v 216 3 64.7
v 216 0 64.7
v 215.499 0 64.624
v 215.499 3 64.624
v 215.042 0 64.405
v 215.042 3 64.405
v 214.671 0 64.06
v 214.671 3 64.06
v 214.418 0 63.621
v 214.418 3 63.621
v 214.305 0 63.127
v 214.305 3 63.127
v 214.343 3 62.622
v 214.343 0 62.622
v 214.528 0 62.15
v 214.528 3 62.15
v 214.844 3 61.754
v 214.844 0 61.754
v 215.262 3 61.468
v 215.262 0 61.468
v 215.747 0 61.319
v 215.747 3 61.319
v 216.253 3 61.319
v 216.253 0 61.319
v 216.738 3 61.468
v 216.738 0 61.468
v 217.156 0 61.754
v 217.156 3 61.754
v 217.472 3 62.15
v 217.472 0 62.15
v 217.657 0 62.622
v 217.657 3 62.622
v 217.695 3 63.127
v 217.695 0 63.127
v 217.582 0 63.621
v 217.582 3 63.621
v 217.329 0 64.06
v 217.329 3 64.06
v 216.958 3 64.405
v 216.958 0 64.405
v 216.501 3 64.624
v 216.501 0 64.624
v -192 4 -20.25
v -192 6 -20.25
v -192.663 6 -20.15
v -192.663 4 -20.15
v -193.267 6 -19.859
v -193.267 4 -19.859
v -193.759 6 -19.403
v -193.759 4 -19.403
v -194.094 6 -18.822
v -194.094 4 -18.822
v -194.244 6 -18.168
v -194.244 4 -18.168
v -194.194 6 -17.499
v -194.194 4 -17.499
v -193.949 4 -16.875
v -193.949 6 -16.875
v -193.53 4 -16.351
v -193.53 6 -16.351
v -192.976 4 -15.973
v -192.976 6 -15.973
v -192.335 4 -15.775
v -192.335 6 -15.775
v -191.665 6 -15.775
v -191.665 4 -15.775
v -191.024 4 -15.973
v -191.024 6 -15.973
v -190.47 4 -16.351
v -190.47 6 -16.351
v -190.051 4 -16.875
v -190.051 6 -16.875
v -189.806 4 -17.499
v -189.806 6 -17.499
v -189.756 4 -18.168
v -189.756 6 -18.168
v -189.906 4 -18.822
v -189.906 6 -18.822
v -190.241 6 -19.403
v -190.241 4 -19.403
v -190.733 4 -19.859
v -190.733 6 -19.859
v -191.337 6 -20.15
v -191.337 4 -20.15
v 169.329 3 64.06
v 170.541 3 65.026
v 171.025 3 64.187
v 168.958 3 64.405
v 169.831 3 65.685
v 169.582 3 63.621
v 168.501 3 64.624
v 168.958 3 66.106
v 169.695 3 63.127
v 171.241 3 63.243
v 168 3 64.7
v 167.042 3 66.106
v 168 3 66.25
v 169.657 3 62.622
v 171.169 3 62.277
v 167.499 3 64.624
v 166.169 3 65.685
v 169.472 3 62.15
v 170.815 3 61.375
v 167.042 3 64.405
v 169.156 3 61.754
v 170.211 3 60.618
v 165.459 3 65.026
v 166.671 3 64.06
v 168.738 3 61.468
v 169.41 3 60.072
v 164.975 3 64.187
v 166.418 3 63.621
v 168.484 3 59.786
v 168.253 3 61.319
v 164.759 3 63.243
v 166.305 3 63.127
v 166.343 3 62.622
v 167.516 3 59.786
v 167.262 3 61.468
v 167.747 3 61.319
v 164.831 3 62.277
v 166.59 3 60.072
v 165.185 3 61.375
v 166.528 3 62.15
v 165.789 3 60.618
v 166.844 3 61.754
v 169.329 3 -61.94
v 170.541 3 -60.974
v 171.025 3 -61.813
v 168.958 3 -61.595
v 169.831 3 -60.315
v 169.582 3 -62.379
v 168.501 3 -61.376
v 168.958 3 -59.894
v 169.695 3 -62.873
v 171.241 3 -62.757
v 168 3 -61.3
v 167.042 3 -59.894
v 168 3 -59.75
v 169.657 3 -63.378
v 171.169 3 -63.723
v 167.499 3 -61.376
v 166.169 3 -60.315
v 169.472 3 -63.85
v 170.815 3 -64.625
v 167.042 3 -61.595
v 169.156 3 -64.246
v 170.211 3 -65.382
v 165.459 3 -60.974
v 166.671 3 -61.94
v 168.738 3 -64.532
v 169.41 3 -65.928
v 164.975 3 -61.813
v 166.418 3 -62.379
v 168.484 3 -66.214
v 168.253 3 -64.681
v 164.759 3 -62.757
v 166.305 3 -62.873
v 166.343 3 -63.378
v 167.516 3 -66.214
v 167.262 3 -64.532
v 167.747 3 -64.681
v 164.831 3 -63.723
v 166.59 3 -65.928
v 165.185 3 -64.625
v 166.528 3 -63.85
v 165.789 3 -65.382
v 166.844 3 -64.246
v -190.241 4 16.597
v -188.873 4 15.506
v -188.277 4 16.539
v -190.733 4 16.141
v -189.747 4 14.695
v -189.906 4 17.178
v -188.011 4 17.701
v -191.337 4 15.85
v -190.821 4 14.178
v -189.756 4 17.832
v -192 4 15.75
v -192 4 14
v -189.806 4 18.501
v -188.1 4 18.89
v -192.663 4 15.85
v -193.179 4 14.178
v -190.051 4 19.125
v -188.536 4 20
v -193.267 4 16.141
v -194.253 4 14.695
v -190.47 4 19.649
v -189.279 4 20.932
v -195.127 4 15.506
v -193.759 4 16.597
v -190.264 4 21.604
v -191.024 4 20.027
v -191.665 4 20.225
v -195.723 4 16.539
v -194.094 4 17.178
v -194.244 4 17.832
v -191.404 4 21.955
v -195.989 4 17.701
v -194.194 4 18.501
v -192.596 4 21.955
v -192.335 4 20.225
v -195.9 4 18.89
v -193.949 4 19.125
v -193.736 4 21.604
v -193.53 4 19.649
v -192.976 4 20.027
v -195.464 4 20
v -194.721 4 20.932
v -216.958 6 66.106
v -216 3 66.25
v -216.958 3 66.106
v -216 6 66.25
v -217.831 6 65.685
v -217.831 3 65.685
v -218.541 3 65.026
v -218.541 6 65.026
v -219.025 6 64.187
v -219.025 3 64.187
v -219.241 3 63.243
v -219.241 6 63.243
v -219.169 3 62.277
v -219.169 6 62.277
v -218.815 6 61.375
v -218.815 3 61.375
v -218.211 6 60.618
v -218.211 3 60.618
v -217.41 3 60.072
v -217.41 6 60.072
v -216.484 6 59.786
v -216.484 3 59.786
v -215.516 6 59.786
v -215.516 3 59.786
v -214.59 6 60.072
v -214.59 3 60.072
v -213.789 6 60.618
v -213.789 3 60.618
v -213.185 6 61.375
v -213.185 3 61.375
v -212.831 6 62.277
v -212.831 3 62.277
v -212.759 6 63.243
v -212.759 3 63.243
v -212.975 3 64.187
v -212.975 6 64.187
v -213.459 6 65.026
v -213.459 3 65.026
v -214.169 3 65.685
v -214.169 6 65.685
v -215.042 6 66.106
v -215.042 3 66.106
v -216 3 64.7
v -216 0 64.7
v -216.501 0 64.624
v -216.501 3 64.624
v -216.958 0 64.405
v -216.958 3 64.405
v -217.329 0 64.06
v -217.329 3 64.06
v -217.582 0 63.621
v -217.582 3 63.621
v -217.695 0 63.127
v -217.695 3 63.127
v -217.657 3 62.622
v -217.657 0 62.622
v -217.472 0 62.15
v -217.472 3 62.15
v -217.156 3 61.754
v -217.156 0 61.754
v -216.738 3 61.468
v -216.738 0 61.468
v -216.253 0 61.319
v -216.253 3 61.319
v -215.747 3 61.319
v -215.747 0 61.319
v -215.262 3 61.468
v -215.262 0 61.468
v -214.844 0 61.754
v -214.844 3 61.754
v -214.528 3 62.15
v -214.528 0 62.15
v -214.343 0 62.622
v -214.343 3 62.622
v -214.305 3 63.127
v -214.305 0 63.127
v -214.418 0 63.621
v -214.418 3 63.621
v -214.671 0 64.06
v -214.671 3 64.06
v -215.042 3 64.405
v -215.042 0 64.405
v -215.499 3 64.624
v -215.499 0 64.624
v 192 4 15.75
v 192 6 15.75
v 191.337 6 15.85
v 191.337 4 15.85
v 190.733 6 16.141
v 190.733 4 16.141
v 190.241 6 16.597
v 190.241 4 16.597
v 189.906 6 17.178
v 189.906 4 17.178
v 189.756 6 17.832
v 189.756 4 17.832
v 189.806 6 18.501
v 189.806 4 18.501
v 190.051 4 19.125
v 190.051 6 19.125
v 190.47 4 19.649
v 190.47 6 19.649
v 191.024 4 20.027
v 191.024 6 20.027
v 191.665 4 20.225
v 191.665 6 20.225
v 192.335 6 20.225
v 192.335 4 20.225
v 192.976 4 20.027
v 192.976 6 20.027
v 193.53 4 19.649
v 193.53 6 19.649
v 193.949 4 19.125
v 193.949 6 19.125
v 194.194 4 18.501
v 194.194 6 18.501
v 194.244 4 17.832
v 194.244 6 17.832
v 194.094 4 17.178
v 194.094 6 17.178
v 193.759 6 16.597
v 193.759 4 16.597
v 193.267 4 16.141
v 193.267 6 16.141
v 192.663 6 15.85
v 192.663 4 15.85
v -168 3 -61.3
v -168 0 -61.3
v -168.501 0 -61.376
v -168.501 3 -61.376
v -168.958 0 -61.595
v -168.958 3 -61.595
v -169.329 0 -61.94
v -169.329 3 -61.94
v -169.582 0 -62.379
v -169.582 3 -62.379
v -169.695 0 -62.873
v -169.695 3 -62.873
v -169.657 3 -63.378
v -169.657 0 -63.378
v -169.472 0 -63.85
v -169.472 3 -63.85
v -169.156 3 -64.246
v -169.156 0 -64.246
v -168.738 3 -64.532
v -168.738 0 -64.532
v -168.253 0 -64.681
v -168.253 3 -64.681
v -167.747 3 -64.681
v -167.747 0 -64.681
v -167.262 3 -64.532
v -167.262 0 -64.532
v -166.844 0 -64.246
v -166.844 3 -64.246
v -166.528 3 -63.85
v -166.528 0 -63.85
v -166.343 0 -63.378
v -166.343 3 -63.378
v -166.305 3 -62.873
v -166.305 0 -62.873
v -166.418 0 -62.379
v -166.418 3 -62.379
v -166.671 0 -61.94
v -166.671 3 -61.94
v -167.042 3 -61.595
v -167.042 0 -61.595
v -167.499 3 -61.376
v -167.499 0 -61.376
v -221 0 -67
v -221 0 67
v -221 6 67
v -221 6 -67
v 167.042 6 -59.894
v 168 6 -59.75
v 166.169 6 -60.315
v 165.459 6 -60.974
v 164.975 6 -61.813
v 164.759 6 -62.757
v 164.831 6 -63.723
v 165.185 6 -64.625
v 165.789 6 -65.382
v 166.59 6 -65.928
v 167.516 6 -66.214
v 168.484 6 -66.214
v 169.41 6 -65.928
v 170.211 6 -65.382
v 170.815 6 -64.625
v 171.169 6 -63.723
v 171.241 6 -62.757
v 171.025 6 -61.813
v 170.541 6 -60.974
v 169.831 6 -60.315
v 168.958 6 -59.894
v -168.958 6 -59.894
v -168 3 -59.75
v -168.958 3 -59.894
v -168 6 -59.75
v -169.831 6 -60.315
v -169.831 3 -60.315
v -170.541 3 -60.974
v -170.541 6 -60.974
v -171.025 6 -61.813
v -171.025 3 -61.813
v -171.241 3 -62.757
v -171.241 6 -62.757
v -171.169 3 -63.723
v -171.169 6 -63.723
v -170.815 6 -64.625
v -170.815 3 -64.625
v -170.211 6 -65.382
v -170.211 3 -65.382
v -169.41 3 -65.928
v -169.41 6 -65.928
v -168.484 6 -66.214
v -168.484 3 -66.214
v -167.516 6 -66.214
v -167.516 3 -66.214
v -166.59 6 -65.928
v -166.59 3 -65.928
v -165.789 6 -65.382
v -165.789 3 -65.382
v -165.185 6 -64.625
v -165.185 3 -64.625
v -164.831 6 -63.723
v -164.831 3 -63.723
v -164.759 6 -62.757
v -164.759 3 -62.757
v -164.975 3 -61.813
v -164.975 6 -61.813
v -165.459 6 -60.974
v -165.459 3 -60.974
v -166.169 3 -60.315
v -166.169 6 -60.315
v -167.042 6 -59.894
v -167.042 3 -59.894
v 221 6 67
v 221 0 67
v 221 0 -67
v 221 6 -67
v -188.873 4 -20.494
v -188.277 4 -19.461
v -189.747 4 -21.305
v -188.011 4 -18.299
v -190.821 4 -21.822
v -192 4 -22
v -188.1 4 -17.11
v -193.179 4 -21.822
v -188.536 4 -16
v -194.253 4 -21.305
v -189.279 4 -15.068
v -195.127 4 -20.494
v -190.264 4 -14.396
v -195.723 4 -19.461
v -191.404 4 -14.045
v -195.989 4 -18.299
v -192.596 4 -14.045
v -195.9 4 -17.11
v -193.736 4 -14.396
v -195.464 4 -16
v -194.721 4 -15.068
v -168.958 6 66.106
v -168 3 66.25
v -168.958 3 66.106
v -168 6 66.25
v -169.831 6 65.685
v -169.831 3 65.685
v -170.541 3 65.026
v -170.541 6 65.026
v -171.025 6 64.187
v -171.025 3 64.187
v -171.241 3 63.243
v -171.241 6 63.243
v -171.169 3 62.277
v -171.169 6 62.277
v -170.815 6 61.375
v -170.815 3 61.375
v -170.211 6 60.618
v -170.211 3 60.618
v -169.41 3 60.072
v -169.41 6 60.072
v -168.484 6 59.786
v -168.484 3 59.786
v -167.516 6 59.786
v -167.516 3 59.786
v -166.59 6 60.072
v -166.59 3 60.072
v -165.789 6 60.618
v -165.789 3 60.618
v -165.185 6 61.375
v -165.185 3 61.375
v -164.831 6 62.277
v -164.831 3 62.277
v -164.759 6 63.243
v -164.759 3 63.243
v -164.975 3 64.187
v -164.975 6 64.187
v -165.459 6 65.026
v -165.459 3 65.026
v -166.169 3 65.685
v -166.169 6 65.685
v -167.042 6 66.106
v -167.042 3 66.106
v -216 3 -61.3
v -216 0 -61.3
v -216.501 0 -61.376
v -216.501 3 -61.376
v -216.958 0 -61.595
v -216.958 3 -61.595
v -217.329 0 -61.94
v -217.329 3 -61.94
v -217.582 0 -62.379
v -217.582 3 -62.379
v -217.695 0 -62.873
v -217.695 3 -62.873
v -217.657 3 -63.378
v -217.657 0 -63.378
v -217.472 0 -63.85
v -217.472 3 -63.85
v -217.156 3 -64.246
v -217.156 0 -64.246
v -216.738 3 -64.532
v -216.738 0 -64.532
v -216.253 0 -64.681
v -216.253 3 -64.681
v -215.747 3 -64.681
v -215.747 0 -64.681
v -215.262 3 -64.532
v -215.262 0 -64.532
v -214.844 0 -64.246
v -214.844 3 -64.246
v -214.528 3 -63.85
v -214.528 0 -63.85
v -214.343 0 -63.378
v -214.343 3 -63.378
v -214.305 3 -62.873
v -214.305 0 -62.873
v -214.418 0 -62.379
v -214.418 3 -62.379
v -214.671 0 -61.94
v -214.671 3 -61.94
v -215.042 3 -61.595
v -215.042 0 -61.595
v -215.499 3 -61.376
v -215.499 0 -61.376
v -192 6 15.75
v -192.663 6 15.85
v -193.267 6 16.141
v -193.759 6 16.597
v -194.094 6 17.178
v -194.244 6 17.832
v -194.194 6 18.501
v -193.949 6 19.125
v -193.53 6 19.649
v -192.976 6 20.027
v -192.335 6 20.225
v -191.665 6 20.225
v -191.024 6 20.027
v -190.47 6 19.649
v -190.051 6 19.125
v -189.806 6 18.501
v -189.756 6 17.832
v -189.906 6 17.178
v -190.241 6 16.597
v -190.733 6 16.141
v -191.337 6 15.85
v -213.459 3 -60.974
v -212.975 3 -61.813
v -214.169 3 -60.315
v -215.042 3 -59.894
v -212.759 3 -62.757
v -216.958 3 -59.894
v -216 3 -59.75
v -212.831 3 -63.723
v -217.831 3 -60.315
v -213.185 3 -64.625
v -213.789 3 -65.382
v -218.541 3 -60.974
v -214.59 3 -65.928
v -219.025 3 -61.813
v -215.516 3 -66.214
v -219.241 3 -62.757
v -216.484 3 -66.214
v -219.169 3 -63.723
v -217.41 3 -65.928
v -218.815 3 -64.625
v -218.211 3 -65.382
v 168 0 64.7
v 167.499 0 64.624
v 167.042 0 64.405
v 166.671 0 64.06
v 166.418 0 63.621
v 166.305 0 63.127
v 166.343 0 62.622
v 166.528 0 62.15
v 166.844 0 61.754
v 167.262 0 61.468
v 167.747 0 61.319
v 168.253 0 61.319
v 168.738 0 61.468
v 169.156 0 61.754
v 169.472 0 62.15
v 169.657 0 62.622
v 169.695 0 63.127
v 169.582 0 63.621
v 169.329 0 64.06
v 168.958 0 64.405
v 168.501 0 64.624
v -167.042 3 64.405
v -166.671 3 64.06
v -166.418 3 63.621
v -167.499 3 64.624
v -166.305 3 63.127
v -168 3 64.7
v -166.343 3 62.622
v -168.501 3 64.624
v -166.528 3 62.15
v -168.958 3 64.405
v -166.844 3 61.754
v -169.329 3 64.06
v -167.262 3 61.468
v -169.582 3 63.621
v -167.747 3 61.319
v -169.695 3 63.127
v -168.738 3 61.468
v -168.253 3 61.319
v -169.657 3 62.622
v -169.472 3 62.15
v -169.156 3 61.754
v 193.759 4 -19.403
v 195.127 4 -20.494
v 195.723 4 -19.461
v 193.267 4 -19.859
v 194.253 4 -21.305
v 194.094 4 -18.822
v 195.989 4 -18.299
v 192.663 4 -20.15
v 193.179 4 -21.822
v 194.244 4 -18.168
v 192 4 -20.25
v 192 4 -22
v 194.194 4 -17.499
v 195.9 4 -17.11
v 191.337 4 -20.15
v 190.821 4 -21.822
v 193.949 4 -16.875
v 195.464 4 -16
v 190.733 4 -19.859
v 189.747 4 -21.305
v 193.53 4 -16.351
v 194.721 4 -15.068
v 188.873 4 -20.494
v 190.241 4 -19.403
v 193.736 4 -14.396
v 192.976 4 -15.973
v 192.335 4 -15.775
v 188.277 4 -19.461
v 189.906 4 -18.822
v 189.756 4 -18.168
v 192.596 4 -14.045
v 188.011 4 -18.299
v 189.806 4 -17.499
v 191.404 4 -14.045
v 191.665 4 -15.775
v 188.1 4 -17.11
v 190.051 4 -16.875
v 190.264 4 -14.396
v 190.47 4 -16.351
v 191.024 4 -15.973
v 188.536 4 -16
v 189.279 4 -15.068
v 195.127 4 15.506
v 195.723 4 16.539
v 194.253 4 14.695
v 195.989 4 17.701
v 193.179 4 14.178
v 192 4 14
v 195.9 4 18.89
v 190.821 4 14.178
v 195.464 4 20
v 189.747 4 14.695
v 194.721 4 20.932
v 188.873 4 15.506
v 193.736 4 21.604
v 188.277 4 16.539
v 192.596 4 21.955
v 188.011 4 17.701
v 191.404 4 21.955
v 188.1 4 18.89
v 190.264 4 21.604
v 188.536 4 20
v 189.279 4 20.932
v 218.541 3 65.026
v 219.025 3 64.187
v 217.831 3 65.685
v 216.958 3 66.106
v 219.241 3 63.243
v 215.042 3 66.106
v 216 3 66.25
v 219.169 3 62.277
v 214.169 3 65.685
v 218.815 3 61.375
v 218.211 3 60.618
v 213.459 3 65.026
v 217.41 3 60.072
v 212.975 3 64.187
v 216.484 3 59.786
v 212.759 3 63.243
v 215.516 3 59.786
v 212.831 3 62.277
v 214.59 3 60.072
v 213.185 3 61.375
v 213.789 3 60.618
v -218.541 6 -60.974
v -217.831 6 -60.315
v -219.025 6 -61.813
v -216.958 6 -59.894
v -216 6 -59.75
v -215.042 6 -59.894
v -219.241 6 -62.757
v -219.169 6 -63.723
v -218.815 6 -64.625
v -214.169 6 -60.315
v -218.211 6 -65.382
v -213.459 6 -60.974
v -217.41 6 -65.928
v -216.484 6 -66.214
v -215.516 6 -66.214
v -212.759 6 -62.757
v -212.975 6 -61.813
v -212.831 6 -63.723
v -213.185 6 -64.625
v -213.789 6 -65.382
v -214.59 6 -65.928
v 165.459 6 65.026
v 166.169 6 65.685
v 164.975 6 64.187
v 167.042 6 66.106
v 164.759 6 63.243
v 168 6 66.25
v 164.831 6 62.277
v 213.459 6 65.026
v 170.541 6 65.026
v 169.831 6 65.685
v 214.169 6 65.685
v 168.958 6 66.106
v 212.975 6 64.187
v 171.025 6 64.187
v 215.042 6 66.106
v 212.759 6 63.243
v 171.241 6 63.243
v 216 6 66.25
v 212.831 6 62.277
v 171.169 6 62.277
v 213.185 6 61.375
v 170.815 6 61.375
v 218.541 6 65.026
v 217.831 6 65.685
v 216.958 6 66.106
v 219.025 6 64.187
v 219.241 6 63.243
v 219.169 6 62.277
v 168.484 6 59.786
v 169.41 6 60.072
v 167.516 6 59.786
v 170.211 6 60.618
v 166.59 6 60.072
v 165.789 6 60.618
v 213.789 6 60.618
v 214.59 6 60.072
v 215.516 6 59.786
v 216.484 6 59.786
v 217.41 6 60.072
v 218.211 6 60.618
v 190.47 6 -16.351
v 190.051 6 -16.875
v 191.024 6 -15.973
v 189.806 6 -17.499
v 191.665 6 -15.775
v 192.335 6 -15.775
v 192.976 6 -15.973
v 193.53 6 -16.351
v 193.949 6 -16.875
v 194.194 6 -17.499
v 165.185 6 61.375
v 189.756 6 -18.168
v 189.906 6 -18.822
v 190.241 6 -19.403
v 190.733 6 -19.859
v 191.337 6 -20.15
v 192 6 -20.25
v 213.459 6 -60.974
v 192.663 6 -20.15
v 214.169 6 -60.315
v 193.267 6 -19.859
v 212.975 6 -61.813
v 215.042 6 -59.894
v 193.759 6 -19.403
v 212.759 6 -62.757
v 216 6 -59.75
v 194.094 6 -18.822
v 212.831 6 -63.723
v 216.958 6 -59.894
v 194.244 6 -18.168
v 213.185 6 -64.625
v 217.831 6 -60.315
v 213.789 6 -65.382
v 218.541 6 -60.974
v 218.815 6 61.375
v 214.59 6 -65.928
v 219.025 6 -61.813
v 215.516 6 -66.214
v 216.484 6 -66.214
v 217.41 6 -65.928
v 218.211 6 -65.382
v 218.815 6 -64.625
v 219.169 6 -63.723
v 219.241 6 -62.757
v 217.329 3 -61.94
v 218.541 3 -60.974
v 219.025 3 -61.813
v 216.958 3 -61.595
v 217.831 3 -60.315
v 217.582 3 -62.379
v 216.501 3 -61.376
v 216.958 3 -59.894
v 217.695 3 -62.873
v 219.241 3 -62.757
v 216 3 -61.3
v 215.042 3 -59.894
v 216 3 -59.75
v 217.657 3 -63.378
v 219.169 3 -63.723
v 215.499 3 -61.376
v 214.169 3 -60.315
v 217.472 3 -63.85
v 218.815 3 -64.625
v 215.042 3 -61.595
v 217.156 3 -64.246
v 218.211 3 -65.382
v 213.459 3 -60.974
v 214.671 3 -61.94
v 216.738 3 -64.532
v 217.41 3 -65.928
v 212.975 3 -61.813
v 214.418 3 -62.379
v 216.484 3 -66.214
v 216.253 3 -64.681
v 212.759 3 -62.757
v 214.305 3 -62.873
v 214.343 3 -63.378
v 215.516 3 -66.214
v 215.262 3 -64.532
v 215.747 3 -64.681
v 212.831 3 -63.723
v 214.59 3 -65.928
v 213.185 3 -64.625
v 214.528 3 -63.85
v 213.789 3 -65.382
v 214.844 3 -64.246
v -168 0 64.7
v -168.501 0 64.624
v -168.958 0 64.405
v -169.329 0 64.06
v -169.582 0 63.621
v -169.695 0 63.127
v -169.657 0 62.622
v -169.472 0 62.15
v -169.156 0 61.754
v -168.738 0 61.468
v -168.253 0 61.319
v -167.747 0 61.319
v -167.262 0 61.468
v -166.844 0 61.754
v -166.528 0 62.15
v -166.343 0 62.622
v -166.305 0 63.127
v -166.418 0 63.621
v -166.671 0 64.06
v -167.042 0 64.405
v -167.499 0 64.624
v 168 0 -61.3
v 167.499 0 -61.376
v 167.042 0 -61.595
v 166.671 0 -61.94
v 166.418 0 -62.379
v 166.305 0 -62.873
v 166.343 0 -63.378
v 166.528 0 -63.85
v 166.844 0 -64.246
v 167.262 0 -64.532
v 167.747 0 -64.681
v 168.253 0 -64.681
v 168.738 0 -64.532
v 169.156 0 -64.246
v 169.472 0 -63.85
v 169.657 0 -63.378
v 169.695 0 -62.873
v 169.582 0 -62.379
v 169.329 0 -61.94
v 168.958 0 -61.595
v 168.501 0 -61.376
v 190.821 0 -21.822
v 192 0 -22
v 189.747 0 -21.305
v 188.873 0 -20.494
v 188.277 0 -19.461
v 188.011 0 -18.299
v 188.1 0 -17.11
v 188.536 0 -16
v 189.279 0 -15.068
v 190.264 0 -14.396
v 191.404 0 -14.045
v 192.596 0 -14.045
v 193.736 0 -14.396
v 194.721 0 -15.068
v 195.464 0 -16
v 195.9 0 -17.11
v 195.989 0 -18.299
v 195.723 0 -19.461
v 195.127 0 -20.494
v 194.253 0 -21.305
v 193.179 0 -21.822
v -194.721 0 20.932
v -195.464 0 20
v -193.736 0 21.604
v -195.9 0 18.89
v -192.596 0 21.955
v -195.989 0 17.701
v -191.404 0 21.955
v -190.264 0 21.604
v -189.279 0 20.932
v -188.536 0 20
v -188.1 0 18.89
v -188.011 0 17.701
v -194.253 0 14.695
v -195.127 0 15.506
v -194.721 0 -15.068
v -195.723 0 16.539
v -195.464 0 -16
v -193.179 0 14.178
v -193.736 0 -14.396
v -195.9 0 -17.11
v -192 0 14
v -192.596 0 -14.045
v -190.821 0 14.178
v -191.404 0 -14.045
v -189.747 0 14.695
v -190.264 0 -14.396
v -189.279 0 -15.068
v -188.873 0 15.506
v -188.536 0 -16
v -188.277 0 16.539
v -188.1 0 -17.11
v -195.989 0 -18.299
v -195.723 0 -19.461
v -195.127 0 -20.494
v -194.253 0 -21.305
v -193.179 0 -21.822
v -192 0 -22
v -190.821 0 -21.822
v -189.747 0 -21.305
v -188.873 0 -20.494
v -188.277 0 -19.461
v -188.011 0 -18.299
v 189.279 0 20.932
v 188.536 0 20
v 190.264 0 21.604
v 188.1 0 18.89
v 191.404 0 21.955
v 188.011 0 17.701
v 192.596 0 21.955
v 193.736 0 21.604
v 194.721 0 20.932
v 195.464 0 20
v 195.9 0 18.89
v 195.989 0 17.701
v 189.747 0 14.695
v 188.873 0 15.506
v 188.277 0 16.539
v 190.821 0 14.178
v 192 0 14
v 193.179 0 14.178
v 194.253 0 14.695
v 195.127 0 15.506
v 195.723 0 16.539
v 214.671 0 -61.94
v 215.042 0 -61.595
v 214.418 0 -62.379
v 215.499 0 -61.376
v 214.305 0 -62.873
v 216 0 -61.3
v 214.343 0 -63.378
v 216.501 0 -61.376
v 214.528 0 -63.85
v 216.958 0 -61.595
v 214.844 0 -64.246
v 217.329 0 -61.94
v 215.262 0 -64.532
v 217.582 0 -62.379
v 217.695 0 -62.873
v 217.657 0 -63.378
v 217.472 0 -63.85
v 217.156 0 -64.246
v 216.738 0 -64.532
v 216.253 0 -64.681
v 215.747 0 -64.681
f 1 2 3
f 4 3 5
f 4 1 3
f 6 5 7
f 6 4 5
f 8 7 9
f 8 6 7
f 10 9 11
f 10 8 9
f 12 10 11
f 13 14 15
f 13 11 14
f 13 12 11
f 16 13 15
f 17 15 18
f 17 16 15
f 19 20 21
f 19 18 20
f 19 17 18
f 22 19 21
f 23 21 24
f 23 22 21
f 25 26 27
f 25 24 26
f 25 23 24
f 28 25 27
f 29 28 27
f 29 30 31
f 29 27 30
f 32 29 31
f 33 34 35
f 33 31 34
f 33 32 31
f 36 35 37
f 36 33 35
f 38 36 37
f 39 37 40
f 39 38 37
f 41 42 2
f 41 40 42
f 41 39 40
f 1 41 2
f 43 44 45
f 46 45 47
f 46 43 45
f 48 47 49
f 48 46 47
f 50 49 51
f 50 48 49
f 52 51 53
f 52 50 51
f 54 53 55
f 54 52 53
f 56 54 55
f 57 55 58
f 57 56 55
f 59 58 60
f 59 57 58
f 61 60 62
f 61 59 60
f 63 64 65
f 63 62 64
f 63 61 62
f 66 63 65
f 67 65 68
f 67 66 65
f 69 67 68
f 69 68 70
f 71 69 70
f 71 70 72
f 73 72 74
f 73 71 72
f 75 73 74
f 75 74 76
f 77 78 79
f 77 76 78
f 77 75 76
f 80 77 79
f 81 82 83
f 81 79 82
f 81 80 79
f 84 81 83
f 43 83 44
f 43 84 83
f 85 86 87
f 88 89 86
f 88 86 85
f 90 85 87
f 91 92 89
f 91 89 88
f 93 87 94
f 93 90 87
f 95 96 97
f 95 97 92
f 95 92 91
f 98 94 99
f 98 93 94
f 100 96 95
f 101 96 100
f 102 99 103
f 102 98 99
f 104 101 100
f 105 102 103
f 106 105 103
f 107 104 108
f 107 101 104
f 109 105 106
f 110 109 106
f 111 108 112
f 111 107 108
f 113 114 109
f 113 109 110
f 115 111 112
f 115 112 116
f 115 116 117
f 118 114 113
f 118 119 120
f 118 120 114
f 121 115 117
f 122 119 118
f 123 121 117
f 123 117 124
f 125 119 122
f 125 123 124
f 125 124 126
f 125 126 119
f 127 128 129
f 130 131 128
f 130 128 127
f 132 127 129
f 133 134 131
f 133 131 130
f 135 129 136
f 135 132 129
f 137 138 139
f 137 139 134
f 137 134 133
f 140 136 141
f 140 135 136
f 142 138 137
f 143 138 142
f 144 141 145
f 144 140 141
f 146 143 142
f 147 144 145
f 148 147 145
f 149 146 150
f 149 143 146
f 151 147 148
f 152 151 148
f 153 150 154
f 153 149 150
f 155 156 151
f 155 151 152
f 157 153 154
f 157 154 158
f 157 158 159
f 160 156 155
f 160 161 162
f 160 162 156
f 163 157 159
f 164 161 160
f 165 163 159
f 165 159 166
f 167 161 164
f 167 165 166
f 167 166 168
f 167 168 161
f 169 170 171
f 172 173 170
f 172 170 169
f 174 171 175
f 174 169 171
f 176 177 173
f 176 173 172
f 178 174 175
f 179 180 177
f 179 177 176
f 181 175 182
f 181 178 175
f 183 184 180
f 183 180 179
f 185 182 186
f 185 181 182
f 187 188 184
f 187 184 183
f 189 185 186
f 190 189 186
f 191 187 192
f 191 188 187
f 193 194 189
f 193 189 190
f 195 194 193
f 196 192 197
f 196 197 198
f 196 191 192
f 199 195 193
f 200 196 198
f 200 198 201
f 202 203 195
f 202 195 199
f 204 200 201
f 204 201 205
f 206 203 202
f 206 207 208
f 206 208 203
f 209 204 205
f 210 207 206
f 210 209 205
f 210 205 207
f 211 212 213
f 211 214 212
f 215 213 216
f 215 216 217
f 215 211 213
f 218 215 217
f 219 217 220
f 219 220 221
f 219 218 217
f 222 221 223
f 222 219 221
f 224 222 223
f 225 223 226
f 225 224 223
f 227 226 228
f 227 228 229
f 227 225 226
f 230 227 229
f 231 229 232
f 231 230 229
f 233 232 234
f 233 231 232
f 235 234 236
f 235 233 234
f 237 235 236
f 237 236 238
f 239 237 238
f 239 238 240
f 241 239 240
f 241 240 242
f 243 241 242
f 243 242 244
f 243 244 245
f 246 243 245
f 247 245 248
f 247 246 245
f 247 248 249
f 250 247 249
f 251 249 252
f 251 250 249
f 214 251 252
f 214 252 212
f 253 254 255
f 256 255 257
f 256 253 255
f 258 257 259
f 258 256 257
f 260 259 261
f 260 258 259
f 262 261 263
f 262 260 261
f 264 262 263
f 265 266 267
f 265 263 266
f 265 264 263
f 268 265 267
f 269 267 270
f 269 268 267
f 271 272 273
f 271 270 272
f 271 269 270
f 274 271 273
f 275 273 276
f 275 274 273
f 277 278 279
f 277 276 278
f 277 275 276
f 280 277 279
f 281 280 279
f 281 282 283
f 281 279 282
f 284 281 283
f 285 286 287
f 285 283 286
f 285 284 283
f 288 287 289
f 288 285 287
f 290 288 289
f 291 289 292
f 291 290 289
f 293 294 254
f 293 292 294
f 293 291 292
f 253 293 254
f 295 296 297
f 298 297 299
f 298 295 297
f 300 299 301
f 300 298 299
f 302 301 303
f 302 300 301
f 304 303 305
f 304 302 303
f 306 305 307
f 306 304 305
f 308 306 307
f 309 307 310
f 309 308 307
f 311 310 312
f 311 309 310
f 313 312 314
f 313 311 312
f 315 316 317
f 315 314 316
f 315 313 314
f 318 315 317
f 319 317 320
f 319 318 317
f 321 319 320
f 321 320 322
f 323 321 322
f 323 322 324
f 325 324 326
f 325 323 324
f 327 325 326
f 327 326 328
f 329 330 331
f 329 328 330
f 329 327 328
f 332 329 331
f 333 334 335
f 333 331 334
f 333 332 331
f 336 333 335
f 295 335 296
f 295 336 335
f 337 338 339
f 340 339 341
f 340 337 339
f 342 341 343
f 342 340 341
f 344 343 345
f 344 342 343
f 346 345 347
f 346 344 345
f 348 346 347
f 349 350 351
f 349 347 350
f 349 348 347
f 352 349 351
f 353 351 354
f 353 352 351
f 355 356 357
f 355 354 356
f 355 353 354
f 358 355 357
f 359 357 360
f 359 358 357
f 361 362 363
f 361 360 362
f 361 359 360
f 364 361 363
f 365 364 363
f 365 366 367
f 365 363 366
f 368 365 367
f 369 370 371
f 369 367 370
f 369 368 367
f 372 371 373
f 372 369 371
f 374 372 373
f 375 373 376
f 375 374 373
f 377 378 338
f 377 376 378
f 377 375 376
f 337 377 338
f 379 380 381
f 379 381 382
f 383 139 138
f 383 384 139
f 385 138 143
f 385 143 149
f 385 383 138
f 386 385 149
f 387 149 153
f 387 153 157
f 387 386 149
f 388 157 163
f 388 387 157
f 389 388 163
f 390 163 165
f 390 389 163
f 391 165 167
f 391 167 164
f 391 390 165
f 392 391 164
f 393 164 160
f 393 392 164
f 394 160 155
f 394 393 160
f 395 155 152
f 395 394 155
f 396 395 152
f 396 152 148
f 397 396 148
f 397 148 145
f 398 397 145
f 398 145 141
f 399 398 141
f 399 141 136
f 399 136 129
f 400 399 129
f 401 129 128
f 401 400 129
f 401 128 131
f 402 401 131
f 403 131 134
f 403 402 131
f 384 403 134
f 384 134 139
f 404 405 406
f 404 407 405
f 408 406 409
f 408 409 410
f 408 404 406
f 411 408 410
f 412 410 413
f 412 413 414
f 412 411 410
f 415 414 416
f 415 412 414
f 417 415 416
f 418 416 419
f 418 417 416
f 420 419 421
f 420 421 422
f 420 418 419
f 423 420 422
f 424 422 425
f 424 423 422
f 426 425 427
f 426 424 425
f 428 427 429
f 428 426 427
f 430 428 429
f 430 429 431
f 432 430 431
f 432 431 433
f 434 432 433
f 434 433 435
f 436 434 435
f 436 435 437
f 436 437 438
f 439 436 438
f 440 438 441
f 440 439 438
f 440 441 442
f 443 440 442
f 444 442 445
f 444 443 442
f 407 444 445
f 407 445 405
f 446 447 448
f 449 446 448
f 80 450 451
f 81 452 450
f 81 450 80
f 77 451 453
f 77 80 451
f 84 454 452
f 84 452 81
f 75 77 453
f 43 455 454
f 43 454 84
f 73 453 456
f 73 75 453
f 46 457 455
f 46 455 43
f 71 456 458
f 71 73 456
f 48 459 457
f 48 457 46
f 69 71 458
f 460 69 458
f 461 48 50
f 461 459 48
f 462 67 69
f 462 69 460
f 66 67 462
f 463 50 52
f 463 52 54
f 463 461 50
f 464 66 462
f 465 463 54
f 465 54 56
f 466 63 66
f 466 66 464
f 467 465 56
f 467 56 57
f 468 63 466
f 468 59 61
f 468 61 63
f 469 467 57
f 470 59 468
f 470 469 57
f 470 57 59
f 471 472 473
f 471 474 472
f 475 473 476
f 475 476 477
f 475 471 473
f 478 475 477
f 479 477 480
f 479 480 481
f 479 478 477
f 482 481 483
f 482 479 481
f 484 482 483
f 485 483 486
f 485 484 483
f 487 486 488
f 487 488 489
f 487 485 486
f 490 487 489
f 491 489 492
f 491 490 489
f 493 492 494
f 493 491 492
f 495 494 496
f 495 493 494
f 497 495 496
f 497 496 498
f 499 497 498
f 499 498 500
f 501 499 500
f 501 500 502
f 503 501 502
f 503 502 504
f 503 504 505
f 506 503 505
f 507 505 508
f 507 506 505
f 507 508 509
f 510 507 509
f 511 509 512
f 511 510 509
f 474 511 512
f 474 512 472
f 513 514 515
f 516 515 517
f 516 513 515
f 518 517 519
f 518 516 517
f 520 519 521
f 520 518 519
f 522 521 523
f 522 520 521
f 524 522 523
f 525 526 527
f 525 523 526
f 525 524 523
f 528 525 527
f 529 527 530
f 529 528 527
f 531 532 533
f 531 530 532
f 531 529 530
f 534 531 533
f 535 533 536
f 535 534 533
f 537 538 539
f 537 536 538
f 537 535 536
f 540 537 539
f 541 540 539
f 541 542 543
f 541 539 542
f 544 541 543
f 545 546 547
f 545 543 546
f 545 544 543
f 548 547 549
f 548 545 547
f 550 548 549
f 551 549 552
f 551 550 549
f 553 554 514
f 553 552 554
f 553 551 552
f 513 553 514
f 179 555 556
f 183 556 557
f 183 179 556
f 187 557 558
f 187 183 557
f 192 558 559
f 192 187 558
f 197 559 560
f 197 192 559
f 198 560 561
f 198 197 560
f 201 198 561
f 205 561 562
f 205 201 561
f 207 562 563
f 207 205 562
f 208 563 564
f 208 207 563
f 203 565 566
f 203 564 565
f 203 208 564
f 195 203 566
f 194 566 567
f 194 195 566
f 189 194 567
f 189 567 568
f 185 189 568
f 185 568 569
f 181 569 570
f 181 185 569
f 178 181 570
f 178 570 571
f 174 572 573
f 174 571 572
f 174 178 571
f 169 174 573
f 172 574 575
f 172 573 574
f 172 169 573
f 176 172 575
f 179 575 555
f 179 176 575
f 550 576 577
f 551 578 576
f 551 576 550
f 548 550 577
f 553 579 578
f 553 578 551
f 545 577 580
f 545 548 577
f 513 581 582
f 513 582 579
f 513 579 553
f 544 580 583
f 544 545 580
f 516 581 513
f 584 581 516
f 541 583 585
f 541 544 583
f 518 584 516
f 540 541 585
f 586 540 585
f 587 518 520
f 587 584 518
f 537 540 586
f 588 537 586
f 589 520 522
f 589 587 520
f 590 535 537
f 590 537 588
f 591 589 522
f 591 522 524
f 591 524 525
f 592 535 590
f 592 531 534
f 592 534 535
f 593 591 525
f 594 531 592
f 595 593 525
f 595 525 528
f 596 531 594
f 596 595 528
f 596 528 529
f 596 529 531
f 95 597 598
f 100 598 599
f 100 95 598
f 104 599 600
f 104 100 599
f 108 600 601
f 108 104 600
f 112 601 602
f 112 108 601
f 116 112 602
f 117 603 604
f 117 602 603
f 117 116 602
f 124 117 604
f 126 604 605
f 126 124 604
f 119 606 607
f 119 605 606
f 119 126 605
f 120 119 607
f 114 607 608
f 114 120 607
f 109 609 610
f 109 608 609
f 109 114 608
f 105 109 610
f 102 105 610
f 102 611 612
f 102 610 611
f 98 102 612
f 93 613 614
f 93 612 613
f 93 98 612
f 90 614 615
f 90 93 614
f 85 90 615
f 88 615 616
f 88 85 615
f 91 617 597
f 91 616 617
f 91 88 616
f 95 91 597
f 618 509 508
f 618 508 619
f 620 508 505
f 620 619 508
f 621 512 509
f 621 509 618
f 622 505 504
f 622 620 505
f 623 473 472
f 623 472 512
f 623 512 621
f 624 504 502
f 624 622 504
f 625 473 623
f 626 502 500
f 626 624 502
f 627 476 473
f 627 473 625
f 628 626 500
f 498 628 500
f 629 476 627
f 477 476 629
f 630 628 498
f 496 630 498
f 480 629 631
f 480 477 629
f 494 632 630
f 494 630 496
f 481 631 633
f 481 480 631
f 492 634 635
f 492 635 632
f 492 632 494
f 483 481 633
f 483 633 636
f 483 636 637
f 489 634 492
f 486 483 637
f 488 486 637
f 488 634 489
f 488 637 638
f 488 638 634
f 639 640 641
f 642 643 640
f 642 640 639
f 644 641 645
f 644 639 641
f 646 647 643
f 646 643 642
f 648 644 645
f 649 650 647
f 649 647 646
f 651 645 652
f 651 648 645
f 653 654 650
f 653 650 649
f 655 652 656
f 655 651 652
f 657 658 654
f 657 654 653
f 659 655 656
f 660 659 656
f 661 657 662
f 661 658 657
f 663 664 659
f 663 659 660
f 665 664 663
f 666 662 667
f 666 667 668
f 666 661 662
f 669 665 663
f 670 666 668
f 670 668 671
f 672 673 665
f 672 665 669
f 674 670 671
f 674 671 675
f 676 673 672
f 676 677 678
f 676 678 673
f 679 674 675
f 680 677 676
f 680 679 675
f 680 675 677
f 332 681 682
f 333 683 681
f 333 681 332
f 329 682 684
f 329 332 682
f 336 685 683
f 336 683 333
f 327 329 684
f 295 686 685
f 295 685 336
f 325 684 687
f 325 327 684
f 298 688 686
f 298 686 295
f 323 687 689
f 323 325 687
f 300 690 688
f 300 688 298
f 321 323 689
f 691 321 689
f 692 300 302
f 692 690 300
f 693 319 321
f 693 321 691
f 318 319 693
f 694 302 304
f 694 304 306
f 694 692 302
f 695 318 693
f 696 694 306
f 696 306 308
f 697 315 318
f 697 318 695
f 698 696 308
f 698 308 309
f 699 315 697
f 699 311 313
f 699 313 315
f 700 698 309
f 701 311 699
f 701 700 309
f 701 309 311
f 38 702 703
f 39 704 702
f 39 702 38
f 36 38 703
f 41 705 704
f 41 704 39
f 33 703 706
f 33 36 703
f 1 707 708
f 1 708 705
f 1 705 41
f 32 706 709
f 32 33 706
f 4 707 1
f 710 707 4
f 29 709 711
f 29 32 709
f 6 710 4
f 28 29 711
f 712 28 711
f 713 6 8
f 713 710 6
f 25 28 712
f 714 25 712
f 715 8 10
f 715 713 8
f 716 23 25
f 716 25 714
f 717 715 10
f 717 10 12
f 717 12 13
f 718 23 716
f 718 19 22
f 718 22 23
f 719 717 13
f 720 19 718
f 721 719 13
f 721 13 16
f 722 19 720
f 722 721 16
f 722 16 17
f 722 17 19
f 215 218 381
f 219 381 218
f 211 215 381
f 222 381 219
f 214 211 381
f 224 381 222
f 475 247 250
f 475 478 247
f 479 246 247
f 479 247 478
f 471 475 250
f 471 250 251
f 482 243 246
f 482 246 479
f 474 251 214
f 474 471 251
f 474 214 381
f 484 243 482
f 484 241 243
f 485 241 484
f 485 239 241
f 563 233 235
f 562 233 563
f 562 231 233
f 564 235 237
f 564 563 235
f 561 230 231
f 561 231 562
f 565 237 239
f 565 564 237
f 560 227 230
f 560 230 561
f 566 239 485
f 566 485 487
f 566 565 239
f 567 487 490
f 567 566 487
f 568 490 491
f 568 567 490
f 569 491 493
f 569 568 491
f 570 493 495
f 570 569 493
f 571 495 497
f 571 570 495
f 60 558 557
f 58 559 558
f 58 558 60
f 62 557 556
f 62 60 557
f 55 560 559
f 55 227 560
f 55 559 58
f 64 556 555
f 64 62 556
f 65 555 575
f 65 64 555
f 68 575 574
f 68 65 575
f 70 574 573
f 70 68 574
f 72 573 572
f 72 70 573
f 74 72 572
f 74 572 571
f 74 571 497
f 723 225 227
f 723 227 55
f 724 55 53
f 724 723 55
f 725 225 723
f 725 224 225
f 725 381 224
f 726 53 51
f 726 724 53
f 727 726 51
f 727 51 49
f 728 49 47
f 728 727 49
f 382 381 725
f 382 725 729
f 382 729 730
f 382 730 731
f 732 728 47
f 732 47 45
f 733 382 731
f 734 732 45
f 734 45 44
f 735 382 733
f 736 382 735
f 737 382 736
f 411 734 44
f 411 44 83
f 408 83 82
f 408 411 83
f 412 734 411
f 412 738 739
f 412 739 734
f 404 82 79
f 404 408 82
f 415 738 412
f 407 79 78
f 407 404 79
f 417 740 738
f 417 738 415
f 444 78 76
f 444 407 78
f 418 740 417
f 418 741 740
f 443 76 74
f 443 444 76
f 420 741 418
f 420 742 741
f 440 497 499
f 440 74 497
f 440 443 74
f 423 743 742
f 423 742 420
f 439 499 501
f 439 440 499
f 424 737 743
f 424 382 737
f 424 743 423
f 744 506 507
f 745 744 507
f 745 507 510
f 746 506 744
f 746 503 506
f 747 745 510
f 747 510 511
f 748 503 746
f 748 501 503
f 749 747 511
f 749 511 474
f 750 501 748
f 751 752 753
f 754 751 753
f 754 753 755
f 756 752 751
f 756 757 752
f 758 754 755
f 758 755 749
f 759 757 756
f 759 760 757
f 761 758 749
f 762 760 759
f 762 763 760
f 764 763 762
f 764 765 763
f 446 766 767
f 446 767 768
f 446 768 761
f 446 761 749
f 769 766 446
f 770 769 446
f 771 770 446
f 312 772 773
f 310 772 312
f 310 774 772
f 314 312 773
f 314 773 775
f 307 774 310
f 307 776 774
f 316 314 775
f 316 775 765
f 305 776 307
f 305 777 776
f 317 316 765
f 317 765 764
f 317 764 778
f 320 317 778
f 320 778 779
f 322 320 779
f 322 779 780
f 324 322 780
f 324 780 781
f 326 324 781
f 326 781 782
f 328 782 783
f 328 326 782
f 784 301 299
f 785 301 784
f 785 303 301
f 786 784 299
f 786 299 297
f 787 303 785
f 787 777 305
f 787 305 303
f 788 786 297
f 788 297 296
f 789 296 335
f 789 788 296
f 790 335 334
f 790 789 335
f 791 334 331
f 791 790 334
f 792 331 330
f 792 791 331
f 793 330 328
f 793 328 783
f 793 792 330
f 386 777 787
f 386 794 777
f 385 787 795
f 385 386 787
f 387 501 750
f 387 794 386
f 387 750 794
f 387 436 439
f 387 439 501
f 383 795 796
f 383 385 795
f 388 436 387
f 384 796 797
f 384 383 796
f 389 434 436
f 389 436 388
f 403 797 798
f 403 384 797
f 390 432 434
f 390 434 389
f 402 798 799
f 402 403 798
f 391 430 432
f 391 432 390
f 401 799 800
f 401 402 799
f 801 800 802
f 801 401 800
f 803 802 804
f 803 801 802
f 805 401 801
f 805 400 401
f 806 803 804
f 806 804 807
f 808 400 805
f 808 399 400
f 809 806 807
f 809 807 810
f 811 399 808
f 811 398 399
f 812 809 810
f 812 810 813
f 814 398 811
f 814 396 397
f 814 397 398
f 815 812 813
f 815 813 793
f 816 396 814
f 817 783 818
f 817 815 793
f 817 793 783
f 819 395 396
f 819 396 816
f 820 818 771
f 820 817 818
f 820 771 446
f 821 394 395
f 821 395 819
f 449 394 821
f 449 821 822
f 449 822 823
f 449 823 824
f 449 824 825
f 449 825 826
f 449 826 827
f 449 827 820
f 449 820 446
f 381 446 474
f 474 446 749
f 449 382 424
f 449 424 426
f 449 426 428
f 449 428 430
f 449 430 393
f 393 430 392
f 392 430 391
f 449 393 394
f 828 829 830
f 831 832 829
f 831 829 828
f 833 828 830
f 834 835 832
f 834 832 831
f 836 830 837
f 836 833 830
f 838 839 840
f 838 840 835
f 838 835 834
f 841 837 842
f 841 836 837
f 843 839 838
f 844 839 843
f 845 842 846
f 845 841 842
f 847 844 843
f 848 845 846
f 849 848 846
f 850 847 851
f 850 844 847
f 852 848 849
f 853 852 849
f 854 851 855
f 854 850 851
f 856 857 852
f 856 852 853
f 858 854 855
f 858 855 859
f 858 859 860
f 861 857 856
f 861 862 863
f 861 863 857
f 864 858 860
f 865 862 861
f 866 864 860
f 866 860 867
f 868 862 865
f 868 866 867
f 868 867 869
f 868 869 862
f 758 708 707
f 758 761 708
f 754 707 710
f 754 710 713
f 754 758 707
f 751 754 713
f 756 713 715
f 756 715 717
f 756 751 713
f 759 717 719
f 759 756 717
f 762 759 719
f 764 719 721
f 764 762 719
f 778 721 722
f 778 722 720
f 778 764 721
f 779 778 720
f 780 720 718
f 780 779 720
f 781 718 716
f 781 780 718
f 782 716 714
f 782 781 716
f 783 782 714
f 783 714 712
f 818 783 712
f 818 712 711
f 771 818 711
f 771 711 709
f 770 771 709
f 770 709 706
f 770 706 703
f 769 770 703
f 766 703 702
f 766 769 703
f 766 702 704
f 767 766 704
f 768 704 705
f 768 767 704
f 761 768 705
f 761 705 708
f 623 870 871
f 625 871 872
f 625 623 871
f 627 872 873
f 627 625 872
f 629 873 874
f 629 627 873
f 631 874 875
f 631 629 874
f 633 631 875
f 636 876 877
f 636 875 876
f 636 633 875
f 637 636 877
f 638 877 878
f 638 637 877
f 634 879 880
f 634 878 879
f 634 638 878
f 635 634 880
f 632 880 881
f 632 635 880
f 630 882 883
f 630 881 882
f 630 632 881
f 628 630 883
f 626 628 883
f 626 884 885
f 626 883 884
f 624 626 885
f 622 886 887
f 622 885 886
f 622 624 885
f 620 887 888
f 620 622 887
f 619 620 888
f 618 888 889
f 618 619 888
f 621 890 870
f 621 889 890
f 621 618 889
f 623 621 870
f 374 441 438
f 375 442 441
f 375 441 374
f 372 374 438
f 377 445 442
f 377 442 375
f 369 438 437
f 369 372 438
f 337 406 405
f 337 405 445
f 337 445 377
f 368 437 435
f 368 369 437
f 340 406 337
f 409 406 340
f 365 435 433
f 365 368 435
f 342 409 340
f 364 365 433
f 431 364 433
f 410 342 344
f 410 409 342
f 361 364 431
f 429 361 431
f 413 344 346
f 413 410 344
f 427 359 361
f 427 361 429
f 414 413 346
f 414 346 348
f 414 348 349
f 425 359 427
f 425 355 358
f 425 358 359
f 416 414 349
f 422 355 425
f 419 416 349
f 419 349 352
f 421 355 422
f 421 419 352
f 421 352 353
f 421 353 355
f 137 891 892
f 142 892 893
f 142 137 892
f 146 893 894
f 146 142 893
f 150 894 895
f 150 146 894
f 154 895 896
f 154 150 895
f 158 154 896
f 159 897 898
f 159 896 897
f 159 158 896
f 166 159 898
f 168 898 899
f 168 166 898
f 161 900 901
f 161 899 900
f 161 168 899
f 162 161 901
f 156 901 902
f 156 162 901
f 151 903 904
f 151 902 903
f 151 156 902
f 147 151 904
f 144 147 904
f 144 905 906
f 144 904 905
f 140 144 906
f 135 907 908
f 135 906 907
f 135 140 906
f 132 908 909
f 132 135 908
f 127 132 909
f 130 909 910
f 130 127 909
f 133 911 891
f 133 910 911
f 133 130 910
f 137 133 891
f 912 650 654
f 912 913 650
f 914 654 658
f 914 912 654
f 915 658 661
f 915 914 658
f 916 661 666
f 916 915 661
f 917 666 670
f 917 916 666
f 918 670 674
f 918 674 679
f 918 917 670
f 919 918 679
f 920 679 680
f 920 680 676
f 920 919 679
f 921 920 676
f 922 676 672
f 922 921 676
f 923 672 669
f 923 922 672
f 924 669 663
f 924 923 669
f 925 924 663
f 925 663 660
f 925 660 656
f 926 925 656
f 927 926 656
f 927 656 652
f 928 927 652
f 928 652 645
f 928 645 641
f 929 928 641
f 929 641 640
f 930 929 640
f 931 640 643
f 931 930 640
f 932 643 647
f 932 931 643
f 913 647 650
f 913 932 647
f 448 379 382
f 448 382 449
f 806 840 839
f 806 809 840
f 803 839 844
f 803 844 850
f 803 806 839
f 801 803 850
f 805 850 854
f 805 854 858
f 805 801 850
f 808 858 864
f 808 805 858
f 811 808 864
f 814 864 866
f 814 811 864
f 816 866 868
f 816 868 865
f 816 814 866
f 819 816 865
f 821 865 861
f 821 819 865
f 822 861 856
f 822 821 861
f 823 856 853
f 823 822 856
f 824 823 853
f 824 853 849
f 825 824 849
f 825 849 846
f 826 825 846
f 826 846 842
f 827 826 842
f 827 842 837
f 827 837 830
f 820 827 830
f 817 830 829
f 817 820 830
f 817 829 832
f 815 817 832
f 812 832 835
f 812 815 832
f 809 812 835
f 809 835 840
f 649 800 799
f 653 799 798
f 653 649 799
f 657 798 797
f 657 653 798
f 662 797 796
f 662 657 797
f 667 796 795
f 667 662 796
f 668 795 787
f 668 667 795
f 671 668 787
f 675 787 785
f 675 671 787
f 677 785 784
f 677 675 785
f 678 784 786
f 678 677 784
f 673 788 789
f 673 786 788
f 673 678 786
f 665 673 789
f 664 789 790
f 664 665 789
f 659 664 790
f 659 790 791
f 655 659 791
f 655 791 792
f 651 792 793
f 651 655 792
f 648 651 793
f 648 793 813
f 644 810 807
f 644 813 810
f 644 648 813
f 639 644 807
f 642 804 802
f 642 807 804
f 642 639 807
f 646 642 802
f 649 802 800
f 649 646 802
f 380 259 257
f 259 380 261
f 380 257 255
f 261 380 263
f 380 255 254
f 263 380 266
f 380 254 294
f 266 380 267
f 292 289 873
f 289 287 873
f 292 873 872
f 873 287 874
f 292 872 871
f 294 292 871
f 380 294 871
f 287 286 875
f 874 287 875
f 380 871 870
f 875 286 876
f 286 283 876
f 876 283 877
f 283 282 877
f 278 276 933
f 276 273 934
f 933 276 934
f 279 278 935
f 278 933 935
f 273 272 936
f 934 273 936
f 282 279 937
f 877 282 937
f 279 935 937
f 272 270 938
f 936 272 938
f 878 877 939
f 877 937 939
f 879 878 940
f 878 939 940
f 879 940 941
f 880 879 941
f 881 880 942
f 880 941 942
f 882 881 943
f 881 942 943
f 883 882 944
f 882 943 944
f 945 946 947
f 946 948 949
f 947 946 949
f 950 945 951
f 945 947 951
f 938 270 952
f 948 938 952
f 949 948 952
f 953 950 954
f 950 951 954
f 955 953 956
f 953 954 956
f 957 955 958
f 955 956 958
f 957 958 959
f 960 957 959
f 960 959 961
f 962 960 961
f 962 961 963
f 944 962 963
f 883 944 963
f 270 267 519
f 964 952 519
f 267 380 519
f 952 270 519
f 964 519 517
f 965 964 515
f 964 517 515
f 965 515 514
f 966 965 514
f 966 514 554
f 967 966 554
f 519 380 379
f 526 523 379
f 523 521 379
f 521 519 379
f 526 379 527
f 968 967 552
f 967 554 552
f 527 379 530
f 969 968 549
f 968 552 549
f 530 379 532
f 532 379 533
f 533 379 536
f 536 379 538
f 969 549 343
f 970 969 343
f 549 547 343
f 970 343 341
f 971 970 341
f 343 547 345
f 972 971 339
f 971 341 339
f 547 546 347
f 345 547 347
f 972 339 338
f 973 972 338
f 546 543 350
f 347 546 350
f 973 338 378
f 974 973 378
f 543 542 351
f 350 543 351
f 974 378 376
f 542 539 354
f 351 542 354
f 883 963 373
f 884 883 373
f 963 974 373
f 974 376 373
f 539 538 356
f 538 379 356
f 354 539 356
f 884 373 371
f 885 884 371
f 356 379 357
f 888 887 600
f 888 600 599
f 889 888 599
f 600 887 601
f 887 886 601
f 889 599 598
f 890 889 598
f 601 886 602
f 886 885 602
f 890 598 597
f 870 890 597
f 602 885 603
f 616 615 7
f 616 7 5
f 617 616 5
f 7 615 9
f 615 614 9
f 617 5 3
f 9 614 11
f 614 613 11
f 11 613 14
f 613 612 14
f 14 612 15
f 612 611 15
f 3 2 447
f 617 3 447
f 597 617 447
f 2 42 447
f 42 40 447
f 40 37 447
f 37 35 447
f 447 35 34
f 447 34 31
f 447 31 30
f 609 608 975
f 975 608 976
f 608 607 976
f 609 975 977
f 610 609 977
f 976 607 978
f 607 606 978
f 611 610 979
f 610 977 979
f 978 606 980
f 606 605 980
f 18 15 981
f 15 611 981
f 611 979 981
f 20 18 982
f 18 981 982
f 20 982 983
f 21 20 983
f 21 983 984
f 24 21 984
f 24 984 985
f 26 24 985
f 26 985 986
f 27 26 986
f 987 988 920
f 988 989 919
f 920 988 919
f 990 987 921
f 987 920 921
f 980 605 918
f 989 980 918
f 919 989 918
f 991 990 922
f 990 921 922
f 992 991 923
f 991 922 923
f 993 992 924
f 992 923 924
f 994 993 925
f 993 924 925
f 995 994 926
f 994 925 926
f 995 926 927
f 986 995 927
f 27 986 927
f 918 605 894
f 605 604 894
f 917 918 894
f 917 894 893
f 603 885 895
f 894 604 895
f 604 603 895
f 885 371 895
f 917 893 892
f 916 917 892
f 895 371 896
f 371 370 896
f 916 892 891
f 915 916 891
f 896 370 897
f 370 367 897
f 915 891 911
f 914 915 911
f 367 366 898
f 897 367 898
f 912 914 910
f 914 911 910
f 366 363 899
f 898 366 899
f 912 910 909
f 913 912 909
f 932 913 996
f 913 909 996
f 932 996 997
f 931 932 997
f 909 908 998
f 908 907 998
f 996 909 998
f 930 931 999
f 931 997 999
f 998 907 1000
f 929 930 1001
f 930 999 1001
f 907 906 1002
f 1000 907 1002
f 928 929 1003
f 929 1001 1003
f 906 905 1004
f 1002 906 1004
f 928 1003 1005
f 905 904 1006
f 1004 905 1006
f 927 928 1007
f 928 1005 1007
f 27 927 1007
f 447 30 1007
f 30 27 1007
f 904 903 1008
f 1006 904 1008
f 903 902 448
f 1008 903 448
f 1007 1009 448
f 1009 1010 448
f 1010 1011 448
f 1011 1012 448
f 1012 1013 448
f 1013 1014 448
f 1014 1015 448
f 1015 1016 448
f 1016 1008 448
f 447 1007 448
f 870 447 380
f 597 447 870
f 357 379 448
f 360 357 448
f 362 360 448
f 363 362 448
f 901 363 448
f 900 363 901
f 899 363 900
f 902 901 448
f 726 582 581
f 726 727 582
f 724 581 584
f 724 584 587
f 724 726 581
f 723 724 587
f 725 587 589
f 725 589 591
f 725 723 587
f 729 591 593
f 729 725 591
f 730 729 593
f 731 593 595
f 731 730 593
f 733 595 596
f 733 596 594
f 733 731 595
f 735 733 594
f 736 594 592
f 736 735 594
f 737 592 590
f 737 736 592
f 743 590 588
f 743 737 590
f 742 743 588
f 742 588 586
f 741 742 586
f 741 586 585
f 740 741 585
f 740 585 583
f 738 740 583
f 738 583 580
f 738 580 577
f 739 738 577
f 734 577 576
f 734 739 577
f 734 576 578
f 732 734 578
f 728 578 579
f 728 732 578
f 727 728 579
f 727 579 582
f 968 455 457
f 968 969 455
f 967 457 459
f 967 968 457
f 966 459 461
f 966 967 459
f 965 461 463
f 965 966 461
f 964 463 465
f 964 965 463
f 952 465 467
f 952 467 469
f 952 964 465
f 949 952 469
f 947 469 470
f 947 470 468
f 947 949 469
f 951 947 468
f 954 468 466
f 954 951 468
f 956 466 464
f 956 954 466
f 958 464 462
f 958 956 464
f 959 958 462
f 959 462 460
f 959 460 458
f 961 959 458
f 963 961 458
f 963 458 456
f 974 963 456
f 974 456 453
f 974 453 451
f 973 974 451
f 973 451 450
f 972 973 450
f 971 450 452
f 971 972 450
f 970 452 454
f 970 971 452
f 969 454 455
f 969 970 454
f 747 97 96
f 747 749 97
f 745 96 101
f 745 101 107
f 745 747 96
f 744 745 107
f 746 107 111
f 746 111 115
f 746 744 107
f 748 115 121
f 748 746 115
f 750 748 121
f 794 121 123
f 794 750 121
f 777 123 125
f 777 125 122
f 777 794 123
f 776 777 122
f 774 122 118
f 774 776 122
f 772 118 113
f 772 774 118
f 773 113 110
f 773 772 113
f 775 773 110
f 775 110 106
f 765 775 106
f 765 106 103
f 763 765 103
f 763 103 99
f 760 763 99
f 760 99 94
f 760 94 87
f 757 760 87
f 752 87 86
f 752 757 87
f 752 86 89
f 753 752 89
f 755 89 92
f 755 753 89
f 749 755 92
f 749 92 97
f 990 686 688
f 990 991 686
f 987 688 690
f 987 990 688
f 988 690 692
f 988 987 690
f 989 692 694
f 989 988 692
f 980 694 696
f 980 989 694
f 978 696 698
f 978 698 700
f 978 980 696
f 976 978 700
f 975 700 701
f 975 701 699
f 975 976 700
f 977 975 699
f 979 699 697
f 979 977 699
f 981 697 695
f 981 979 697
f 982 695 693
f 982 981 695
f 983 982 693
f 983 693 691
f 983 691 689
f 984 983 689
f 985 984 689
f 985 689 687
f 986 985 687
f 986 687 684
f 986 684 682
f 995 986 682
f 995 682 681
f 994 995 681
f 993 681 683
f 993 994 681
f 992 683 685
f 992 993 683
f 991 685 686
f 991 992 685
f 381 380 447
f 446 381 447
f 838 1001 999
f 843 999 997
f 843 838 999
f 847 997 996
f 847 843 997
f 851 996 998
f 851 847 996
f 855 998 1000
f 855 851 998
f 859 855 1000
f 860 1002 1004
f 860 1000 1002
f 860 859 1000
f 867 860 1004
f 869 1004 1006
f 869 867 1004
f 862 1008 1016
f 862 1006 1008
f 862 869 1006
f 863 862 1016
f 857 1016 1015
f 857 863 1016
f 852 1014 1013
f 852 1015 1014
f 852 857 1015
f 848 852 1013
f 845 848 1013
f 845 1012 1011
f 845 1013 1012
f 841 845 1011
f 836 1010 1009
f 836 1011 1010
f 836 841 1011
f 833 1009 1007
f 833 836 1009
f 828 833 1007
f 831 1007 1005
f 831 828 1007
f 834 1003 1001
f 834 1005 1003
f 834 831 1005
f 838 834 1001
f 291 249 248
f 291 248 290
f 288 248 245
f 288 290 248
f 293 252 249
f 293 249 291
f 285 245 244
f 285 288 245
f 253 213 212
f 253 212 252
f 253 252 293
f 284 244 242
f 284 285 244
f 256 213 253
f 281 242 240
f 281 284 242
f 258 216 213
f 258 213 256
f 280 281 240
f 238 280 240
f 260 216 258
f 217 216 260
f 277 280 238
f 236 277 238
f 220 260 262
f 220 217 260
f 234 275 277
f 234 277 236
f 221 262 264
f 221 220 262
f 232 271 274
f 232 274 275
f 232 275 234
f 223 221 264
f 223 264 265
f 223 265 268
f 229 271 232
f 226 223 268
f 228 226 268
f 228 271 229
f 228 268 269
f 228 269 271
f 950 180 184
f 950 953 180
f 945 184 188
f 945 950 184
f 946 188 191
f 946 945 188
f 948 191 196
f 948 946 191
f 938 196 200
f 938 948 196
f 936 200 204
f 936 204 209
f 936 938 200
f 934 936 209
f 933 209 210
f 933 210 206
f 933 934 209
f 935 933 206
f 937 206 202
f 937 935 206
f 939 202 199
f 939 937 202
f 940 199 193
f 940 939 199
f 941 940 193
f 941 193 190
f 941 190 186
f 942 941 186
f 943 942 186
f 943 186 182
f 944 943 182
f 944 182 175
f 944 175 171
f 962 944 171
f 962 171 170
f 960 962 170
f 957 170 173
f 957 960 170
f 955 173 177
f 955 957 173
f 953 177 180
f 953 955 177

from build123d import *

# Parameters (mm, degrees)
SKETCH1_W                     = 442
SKETCH1_H                     = 134
BOSS_EXTRUDE1_DEPTH           = 6
CBORE_FOR_M3_SHCS2_AT_2_COUNT = 2
CBORE_FOR_M3_SHCS2_AT_2_PITCH = 48
CBORE_FOR_M3_SHCS2_AT_3_COUNT = 2
CBORE_FOR_M3_SHCS2_AT_3_PITCH = 134.833230325
CBORE_FOR_M3_SHCS2_AT_4_COUNT = 2
CBORE_FOR_M3_SHCS2_AT_4_PITCH = 126
CBORE_FOR_M4_SHCS1_AT_2_COUNT = 2
CBORE_FOR_M4_SHCS1_AT_2_PITCH = 36
LPATTERN1_COUNT               = 2
LPATTERN1_PITCH               = 384


with BuildPart() as part:
    # Sketch1 → Boss-Extrude1 (new body)
    with BuildSketch(Plane(origin=(0, 0, 0), x_dir=(1, 0, 0), z_dir=(0, 1, 0))):
        Rectangle(SKETCH1_W, SKETCH1_H)
    extrude(amount=BOSS_EXTRUDE1_DEPTH)

    # Sketch3 → CBORE for M3 SHCS2 (revolve, cut)
    with BuildSketch(Plane(origin=(216, 6, -63), x_dir=(0, 0, 1), z_dir=(1, 0, 0))):
        Polygon((0, 0), (0, 18.401463052), (1.7, 17.38), (1.7, 3), (3.25, 3), (3.25, 0), align=None)
    cbore_for_m3_shcs2 = revolve(axis=Axis((216, 12.35, -63), (0, -1, 0)), mode=Mode.SUBTRACT)

    # CBORE for M3 SHCS2 at 2: CBORE for M3 SHCS2 ×2
    with Locations(*[(-i * CBORE_FOR_M3_SHCS2_AT_2_PITCH, 0, 0) for i in range(1, CBORE_FOR_M3_SHCS2_AT_2_COUNT)]):
        add(cbore_for_m3_shcs2, mode=Mode.SUBTRACT)

    # CBORE for M3 SHCS2 at 3: CBORE for M3 SHCS2 ×2
    with Locations(*[Vector(-0.35599532759198804, 0, 0.9344877349289681) * (i * CBORE_FOR_M3_SHCS2_AT_3_PITCH) for i in range(1, CBORE_FOR_M3_SHCS2_AT_3_COUNT)]):
        add(cbore_for_m3_shcs2, mode=Mode.SUBTRACT)

    # CBORE for M3 SHCS2 at 4: CBORE for M3 SHCS2 ×2
    with Locations(*[(0, 0, i * CBORE_FOR_M3_SHCS2_AT_4_PITCH) for i in range(1, CBORE_FOR_M3_SHCS2_AT_4_COUNT)]):
        add(cbore_for_m3_shcs2, mode=Mode.SUBTRACT)

    # Sketch6 → CBORE for M4 SHCS1 (revolve, cut)
    with BuildSketch(Plane(origin=(192, 0, 18), x_dir=(0, 0, -1), z_dir=(1, 0, 0))):
        Polygon((0, 0), (0, 11.351936393), (2.25, 10), (2.25, 4), (4, 4), (4, 0), align=None)
    cbore_for_m4_shcs1 = revolve(axis=Axis((192, -6.35, 18), (0, 1, 0)), mode=Mode.SUBTRACT)

    # CBORE for M4 SHCS1 at 2: CBORE for M4 SHCS1 ×2
    with Locations(*[(0, 0, -i * CBORE_FOR_M4_SHCS1_AT_2_PITCH) for i in range(1, CBORE_FOR_M4_SHCS1_AT_2_COUNT)]):
        add(cbore_for_m4_shcs1, mode=Mode.SUBTRACT)

    # LPattern1: CBORE for M3 SHCS2, CBORE for M4 SHCS1 ×2
    with Locations(*[(-i * LPATTERN1_PITCH, 0, 0) for i in range(1, LPATTERN1_COUNT)]):
        add(cbore_for_m3_shcs2, mode=Mode.SUBTRACT)
        add(cbore_for_m4_shcs1, mode=Mode.SUBTRACT)

    # LPattern1 copy 1 sketch → LPattern1 copy 1 (revolve, cut)
    with BuildSketch(Plane(origin=(-216, 6, -63), x_dir=(0, 0, 1), z_dir=(1, 0, 0))):
        Polygon((0, 0), (0, 18.401463052), (1.7, 17.38), (1.7, 3), (3.25, 3), (3.25, 0), align=None)
    revolve(axis=Axis((-216, 12.35, -63), (0, -1, 0)), mode=Mode.SUBTRACT)

    # LPattern1 copy 2 sketch → LPattern1 copy 2 (revolve, cut)
    with BuildSketch(Plane(origin=(-216, 6, 63), x_dir=(0, 0, 1), z_dir=(1, 0, 0))):
        Polygon((0, 0), (0, 18.401463052), (1.7, 17.38), (1.7, 3), (3.25, 3), (3.25, 0), align=None)
    revolve(axis=Axis((-216, 12.35, 63), (0, -1, 0)), mode=Mode.SUBTRACT)

    # LPattern1 copy 3 sketch → LPattern1 copy 3 (revolve, cut)
    with BuildSketch(Plane(origin=(-168, 6, 63), x_dir=(0, 0, 1), z_dir=(1, 0, 0))):
        Polygon((0, 0), (0, 18.401463052), (1.7, 17.38), (1.7, 3), (3.25, 3), (3.25, 0), align=None)
    revolve(axis=Axis((-168, 12.35, 63), (0, -1, 0)), mode=Mode.SUBTRACT)

    # LPattern1 copy 4 sketch → LPattern1 copy 4 (revolve, cut)
    with BuildSketch(Plane(origin=(-192, 0, -18), x_dir=(0, 0, -1), z_dir=(1, 0, 0))):
        Polygon((0, 0), (0, 11.351936393), (2.25, 10), (2.25, 4), (4, 4), (4, 0), align=None)
    revolve(axis=Axis((-192, -6.35, -18), (0, 1, 0)), mode=Mode.SUBTRACT)


solid = part.part
